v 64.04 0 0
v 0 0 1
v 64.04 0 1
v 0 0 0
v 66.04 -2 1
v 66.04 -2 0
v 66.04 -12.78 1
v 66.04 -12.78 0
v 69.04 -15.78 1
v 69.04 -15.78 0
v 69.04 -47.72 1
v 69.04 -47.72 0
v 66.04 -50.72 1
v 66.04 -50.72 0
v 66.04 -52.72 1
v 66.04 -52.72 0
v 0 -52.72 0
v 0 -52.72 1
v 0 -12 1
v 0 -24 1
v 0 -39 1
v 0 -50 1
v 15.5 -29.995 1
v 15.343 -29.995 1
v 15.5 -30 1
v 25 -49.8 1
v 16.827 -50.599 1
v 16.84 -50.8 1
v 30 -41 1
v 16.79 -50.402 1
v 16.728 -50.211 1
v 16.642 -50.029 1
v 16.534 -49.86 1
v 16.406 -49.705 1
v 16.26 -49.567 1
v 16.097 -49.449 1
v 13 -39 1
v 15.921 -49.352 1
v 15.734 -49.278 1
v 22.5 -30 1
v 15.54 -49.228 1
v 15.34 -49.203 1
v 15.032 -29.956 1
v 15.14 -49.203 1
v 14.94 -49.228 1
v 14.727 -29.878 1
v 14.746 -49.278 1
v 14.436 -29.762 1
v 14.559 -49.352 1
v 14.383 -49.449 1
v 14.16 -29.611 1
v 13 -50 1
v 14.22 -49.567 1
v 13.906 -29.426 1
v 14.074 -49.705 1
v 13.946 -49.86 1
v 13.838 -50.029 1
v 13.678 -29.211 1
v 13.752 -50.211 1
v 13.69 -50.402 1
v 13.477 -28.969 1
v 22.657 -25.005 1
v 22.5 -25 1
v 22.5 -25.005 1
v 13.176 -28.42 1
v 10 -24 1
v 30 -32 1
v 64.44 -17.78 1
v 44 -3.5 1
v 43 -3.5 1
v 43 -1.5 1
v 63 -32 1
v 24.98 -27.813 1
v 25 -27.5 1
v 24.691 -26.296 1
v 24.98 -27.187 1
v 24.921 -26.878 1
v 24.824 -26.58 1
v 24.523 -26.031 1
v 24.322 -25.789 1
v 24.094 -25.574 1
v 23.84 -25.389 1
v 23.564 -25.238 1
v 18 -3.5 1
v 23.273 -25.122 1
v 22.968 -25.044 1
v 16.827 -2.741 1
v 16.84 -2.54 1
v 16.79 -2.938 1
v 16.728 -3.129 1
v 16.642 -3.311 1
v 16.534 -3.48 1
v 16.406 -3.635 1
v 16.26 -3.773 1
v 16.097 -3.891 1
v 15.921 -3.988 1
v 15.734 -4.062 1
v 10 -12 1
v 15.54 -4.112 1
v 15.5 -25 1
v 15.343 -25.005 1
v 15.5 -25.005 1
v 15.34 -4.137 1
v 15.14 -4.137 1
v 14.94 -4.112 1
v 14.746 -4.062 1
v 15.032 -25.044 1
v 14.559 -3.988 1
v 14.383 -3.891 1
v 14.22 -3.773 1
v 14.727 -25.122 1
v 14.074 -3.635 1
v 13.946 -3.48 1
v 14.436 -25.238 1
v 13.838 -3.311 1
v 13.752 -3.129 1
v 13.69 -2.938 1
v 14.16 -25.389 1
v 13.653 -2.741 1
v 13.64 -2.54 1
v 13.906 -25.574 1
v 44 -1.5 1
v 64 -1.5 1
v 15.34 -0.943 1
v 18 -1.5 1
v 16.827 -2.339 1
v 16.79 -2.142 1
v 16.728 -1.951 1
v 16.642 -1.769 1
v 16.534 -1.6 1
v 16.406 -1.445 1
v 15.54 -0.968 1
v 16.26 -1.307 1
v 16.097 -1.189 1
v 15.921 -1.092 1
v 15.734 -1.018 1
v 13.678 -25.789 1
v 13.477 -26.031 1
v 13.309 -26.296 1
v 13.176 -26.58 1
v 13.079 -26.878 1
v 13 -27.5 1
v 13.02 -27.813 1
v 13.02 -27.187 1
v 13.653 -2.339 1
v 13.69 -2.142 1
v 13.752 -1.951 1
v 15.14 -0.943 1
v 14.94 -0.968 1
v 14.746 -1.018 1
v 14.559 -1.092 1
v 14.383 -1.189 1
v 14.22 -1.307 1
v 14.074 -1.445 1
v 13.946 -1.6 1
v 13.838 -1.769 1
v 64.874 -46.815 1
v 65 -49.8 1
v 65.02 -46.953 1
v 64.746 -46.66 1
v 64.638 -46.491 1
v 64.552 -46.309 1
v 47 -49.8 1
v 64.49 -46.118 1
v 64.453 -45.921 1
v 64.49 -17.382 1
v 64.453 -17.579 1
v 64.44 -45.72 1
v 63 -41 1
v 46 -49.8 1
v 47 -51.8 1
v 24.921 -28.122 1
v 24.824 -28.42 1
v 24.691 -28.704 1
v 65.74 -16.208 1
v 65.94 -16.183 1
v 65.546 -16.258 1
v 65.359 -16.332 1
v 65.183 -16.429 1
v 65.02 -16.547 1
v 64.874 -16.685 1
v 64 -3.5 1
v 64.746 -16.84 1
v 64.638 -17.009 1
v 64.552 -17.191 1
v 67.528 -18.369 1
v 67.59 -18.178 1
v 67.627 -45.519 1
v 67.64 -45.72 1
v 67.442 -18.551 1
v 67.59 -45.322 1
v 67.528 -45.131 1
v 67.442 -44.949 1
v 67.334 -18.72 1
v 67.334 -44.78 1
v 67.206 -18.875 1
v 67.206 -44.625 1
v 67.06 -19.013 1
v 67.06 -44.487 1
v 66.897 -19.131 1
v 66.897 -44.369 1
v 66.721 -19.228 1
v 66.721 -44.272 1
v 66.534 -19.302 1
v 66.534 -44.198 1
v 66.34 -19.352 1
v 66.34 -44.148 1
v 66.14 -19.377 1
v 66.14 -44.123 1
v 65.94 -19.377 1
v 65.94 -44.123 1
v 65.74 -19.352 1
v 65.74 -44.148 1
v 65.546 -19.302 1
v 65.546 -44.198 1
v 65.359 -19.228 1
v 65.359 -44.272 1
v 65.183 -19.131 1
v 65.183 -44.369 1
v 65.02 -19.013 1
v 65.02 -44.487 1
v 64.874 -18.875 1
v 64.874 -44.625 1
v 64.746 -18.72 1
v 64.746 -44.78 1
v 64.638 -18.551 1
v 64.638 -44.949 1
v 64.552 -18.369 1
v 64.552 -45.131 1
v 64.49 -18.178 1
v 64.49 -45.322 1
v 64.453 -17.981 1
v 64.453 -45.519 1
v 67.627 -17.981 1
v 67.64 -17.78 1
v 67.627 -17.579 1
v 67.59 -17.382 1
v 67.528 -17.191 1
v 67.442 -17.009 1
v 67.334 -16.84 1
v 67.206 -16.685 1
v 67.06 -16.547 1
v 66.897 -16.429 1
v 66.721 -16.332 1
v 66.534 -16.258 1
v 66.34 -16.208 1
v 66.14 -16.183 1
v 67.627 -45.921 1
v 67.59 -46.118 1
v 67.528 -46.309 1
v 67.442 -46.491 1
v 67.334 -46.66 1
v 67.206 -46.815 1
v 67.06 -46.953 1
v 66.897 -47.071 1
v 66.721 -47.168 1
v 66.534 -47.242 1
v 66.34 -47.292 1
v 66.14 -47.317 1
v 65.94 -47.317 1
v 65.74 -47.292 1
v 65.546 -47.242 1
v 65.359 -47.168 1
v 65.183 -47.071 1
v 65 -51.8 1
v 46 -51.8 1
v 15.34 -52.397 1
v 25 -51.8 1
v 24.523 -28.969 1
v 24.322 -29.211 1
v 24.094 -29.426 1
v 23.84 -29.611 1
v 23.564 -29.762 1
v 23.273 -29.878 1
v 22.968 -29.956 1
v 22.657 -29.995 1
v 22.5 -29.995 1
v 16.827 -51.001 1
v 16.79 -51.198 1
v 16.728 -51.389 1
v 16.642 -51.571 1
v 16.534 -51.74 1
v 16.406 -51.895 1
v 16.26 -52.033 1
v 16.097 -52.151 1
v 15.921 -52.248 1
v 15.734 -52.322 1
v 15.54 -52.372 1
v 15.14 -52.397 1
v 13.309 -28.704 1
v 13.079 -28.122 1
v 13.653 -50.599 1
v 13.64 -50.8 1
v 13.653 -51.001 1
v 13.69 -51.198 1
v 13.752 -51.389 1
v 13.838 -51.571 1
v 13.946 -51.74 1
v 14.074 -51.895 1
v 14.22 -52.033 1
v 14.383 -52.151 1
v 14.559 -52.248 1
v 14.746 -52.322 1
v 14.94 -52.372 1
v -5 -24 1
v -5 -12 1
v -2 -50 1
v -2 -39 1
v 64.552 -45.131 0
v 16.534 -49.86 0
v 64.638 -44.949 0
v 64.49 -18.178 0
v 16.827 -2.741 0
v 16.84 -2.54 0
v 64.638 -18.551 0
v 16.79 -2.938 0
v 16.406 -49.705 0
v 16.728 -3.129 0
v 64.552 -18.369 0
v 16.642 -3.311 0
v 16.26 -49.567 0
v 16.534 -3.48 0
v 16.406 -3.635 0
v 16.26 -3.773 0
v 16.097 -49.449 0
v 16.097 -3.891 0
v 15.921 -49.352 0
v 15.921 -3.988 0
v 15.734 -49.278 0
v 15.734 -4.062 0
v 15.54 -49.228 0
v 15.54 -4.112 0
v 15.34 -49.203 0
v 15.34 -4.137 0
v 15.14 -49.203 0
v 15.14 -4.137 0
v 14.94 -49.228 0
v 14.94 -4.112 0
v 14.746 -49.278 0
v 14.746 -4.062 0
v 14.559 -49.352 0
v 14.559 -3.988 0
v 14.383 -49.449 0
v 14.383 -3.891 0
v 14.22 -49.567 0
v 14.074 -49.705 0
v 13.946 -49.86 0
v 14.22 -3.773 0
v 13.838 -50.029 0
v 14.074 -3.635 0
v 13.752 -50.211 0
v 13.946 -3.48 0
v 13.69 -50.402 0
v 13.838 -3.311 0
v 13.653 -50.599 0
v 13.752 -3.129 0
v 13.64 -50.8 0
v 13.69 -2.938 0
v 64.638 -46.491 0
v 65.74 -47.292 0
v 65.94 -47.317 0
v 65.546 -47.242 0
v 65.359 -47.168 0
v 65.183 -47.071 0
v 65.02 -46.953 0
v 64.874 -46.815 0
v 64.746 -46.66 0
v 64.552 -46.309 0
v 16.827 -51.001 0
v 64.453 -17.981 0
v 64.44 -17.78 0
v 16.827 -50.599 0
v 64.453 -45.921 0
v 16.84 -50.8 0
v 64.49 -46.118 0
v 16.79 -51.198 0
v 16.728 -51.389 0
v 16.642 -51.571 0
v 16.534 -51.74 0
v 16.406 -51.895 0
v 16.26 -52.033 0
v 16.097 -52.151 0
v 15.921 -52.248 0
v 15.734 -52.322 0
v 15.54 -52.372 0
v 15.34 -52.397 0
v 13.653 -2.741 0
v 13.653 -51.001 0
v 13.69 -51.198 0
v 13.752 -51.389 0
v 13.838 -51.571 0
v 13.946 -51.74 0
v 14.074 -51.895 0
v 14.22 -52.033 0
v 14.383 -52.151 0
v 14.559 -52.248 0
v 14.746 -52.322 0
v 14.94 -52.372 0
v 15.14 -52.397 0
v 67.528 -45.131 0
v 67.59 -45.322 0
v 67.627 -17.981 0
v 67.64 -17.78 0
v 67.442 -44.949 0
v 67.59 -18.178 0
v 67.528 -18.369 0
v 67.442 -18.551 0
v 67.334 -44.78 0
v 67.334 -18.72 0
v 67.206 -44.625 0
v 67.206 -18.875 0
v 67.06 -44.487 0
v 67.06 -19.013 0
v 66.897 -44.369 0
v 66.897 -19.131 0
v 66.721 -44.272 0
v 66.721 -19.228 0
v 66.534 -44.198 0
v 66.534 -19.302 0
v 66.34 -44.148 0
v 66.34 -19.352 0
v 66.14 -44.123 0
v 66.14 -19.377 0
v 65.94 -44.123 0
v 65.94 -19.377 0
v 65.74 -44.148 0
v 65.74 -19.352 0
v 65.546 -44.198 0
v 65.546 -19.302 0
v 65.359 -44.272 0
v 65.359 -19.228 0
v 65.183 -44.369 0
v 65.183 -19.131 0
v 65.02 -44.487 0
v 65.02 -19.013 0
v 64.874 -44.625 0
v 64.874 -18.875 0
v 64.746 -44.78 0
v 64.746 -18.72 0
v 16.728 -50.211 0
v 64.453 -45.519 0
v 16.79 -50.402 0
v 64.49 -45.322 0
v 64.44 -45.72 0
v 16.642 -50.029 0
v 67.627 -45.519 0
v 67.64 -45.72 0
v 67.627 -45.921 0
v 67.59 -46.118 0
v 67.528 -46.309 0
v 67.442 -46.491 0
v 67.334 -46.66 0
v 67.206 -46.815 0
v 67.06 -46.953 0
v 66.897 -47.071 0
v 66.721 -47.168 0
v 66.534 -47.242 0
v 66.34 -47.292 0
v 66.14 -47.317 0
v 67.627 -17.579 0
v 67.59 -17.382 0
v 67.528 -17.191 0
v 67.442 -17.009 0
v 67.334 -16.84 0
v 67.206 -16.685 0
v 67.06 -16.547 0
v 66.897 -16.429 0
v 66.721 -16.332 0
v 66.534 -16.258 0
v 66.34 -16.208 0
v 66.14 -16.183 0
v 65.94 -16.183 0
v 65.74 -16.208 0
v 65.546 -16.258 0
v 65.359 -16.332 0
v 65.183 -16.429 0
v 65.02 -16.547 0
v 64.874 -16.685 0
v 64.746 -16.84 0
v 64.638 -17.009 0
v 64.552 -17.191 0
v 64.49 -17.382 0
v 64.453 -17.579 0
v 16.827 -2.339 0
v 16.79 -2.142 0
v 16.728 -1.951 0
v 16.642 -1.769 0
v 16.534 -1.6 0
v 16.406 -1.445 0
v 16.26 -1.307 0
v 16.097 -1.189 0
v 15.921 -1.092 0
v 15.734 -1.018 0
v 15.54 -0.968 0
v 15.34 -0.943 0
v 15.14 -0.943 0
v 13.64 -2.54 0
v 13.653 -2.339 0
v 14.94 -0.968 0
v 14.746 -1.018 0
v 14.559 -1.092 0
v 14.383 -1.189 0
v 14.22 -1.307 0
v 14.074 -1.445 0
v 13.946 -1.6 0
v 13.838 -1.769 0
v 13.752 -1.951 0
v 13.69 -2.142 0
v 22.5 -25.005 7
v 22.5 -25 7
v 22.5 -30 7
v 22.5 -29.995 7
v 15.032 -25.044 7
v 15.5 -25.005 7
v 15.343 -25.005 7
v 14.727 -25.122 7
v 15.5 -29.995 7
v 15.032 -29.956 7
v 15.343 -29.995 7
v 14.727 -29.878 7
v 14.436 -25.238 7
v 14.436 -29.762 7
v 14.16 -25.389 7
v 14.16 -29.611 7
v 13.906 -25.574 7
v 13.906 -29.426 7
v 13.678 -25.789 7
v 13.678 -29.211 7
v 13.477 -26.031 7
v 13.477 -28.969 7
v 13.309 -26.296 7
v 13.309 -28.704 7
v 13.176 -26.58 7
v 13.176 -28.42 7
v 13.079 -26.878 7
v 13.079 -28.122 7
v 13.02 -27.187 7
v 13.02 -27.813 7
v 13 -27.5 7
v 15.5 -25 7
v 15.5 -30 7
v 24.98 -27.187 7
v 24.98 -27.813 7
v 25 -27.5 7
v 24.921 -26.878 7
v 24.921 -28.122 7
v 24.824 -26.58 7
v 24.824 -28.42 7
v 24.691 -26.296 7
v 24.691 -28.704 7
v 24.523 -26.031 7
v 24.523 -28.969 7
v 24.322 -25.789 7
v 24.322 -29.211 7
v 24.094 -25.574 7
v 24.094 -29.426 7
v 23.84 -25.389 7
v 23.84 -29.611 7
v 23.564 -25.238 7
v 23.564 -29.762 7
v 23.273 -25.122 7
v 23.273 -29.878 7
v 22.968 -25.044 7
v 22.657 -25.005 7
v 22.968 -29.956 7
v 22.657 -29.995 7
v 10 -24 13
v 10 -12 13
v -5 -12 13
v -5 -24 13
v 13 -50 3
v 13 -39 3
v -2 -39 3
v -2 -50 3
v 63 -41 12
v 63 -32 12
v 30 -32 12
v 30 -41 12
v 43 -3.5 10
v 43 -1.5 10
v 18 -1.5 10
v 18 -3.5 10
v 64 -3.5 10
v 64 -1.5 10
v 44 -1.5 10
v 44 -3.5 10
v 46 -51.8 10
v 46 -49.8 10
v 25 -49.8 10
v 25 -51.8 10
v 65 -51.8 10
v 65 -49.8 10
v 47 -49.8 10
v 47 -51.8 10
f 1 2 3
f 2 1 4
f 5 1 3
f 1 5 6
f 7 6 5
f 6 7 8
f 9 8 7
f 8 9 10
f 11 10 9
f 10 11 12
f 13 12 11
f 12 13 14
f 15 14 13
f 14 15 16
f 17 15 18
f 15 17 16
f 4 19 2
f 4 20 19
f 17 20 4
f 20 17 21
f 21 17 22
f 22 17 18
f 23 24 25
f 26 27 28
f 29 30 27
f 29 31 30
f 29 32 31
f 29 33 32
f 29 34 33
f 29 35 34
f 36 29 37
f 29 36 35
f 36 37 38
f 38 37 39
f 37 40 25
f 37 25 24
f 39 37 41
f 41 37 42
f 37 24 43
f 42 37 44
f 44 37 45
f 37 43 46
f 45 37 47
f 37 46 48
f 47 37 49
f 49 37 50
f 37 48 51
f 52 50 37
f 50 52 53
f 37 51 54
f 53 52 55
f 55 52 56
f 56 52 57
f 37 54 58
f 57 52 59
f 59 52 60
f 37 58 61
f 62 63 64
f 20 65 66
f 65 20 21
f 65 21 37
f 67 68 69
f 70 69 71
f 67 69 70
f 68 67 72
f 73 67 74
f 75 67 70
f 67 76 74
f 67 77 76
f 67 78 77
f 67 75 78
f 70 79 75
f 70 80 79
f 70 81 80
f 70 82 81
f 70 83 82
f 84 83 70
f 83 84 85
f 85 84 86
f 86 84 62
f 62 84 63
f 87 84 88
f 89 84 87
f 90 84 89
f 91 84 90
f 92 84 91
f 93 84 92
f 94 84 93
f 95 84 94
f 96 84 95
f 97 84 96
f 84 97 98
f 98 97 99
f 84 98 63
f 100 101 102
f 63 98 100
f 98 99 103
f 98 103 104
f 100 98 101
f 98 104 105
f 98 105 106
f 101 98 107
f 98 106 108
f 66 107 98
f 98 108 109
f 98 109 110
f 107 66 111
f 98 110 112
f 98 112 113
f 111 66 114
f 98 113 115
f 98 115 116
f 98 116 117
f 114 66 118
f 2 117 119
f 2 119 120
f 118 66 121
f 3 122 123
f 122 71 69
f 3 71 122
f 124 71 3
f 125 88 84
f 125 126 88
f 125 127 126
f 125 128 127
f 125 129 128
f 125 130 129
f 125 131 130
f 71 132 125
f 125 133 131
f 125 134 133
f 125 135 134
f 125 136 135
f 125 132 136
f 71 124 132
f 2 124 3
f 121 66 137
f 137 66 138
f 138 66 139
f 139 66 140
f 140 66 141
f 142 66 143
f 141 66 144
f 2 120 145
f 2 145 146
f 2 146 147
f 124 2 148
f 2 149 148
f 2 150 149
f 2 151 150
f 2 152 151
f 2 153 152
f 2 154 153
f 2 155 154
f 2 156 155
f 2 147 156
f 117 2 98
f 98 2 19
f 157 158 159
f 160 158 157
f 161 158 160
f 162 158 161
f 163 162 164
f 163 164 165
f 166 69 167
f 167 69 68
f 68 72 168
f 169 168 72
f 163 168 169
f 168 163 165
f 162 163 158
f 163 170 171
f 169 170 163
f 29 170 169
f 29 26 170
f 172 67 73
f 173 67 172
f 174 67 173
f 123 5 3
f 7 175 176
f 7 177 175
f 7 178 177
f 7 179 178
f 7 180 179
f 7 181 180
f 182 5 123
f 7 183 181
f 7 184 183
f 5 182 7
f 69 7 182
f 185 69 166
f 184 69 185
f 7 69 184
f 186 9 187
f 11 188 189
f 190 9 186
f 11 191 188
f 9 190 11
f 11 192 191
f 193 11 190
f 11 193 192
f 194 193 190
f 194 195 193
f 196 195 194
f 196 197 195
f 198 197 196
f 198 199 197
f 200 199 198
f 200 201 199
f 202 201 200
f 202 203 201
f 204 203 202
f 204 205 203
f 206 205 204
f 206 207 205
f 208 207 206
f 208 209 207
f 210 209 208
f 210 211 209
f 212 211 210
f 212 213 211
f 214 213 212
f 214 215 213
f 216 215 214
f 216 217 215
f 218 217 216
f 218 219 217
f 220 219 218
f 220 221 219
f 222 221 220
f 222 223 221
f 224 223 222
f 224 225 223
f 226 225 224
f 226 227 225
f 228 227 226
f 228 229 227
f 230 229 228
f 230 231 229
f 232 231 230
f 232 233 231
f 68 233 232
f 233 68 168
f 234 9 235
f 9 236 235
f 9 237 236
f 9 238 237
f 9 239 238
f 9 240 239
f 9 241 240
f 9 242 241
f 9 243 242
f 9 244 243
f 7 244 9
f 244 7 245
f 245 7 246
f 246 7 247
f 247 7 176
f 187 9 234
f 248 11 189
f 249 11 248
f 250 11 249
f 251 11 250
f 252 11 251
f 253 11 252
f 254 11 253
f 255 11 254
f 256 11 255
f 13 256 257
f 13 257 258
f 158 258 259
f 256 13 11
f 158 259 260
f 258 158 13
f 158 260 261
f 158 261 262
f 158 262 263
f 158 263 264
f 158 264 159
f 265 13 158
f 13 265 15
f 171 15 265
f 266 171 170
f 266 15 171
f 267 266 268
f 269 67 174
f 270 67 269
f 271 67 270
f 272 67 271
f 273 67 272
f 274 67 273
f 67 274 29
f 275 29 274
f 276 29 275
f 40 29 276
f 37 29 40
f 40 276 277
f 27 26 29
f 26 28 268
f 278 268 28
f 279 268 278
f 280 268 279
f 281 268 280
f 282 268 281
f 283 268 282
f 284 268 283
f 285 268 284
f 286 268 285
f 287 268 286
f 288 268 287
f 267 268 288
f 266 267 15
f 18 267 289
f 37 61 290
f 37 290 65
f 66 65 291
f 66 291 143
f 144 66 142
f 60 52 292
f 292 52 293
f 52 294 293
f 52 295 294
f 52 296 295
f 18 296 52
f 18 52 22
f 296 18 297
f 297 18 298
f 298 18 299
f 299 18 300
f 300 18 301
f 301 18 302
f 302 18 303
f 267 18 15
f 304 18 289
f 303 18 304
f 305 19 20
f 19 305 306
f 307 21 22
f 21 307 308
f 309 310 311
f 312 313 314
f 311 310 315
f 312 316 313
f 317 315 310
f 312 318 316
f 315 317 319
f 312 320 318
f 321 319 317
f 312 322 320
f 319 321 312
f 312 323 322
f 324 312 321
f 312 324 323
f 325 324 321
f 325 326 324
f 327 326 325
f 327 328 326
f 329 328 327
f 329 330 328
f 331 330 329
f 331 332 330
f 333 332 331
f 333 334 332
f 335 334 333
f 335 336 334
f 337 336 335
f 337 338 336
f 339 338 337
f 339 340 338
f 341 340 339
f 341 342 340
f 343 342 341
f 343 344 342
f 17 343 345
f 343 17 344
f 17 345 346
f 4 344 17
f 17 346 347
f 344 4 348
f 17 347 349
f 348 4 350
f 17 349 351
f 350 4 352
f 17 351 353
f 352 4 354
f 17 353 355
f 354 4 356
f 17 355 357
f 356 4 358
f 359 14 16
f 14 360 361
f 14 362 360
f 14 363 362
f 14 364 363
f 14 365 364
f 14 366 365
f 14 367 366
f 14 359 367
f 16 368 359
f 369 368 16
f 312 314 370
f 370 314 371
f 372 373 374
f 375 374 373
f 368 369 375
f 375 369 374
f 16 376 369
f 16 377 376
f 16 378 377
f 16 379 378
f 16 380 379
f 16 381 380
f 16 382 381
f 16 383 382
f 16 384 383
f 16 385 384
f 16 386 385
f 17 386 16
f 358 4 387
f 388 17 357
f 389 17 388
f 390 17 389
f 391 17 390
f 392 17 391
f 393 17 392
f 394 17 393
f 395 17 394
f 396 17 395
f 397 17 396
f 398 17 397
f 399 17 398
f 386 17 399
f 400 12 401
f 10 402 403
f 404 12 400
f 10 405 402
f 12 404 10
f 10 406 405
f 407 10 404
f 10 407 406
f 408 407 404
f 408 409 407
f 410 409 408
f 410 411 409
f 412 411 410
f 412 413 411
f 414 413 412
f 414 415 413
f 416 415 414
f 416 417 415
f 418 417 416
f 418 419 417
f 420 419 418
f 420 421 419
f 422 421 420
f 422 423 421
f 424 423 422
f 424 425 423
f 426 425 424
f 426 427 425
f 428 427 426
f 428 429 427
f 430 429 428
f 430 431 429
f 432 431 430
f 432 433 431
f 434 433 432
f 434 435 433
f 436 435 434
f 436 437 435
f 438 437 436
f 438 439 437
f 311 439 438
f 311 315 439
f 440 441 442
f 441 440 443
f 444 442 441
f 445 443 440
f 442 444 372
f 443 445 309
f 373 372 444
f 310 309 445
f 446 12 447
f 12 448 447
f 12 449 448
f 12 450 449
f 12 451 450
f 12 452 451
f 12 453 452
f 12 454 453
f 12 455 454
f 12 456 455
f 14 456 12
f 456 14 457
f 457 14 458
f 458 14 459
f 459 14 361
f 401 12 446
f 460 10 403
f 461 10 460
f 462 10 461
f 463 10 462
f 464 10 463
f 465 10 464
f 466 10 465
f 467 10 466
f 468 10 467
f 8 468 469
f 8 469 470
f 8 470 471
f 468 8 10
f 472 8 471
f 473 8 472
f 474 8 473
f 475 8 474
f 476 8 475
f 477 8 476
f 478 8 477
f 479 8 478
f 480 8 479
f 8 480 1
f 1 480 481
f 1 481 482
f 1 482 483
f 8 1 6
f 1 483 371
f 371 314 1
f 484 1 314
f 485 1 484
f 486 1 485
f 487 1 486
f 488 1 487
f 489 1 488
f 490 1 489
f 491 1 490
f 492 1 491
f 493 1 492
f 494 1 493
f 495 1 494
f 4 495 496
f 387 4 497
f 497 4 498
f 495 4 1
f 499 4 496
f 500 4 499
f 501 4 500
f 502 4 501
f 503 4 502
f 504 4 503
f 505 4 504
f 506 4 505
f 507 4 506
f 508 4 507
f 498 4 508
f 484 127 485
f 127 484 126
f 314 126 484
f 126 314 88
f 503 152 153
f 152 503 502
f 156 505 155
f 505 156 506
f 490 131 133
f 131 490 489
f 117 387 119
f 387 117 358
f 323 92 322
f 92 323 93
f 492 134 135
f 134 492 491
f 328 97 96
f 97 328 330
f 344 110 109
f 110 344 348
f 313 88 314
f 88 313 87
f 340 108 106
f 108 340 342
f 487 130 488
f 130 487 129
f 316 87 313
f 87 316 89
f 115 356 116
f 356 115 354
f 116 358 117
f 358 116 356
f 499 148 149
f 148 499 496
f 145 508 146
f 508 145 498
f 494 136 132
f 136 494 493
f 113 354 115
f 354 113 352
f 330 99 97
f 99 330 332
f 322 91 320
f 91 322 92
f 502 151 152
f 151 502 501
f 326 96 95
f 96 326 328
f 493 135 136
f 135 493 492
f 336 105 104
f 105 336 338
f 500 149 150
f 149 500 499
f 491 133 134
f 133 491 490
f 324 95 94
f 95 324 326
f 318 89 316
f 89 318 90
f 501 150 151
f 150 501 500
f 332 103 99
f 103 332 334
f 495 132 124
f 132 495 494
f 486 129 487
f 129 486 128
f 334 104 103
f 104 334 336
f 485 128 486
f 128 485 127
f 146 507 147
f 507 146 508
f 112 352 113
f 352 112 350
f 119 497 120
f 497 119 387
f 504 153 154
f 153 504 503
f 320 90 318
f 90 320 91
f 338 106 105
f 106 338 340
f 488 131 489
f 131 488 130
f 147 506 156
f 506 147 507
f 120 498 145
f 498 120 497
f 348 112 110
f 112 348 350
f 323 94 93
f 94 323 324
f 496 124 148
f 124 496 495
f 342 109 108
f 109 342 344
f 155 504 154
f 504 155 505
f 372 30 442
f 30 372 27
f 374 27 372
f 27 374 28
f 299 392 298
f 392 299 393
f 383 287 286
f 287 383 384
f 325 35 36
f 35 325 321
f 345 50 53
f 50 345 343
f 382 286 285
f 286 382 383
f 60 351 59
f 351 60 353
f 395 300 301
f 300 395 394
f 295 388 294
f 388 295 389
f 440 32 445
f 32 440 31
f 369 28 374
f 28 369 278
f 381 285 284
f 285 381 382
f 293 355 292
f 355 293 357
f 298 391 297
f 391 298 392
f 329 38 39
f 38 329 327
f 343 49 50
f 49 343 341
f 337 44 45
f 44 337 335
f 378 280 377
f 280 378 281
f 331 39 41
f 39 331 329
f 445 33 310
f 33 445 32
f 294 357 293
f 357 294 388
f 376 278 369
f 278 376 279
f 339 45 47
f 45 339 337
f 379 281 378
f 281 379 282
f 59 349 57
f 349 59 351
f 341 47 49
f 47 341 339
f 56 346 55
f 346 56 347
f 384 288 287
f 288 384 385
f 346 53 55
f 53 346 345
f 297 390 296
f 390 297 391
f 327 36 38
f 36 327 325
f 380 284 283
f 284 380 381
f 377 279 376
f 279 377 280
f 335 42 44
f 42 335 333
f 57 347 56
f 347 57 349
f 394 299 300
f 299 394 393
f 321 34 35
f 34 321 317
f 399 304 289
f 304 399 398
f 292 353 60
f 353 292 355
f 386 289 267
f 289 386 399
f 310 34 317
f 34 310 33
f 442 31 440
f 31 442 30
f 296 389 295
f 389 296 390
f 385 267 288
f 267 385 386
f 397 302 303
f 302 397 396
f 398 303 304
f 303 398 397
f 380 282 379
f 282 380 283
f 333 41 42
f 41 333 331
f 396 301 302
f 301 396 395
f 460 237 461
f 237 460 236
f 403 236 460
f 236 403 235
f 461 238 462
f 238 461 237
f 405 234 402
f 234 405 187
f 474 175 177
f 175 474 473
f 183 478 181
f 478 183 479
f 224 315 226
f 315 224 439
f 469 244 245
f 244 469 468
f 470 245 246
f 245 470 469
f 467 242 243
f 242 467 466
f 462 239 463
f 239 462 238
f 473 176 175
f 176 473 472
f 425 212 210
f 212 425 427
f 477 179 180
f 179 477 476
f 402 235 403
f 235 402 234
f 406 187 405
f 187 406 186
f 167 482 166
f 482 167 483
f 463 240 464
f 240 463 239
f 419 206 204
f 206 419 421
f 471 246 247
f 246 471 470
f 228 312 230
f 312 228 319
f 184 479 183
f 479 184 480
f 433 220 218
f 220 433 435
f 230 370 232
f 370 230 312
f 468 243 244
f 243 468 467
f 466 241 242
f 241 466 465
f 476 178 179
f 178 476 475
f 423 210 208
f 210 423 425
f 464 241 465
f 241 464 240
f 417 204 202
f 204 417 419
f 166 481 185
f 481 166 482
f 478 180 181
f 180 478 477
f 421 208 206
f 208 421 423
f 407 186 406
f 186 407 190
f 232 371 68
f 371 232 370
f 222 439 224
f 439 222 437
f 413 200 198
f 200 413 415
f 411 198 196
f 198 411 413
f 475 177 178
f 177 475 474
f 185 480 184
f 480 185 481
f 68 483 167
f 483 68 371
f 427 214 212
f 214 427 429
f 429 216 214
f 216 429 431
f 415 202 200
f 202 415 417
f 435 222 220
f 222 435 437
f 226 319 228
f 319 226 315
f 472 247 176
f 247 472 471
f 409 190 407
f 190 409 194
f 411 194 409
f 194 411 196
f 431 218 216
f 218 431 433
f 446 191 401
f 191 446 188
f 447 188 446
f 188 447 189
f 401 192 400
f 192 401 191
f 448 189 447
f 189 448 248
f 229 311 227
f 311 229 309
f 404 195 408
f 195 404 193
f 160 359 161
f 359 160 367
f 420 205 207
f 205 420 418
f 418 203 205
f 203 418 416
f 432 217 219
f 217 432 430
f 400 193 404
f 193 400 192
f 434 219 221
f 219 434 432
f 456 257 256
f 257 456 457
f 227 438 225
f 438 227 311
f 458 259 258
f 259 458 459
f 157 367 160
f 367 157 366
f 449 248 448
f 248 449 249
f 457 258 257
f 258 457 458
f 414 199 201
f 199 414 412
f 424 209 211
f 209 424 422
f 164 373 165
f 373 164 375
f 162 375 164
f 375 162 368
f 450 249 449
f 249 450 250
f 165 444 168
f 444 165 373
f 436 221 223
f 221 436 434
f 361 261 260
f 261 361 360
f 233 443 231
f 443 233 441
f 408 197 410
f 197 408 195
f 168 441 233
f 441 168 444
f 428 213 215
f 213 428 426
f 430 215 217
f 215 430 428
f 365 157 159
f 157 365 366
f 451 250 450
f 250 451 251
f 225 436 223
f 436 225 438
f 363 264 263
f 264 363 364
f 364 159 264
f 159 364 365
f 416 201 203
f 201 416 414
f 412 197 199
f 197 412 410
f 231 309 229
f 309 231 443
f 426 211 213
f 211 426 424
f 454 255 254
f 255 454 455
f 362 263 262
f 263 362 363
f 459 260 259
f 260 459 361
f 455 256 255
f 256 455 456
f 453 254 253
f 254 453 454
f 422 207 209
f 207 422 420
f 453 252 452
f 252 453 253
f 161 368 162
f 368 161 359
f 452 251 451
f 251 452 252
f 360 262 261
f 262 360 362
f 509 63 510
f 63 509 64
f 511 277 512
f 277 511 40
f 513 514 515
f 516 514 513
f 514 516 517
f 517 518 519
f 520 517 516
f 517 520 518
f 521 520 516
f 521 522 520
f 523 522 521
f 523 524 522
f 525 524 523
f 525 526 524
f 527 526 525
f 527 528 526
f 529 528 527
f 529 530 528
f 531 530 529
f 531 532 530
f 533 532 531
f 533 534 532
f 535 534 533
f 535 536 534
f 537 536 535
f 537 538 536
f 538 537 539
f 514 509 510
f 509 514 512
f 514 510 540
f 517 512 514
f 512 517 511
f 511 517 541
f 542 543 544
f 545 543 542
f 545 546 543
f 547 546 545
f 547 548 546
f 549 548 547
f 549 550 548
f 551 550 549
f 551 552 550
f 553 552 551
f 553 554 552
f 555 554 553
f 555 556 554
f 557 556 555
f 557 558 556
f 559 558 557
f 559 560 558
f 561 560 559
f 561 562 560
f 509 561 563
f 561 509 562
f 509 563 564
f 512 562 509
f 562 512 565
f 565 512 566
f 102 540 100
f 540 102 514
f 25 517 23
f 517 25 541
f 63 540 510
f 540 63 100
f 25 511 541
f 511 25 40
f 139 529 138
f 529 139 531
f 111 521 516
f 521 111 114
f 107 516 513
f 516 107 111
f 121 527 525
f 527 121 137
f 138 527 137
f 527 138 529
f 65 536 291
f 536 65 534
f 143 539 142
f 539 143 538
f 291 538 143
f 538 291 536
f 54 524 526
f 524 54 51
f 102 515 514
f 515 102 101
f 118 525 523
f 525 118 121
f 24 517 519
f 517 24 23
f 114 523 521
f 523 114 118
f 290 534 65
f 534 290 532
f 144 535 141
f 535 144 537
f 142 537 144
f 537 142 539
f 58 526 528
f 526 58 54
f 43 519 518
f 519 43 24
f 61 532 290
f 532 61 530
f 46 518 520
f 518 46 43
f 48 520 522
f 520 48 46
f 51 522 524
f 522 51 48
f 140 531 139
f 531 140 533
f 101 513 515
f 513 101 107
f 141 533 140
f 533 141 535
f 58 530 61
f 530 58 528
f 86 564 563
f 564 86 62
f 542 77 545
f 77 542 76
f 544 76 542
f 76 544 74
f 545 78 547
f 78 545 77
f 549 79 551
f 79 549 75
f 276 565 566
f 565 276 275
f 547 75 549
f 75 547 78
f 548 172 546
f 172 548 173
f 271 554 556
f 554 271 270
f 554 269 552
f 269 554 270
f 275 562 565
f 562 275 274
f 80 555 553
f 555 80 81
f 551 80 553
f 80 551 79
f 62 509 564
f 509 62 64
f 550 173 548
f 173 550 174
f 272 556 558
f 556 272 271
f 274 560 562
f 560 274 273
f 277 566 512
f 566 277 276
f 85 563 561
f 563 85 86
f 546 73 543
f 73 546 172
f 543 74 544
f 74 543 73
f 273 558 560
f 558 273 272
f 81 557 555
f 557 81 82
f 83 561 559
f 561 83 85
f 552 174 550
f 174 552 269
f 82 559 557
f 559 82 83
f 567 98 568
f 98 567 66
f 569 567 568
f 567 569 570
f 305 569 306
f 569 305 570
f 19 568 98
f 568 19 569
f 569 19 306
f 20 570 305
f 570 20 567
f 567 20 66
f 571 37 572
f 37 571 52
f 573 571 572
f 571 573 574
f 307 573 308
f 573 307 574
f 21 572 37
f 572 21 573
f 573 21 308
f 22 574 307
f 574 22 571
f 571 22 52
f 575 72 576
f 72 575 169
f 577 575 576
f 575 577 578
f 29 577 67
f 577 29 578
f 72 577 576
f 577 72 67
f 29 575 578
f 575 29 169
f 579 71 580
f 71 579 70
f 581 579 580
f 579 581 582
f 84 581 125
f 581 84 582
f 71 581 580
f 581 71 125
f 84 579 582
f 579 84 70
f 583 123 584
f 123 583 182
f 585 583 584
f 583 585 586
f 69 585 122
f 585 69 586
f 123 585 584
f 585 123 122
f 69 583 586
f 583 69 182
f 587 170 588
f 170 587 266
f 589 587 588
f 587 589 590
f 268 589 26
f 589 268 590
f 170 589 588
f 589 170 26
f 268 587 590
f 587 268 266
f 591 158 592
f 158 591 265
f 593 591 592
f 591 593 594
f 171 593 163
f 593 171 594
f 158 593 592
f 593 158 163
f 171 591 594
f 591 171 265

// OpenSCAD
module arduino_uno(){
    color("blue")
    difference() {
        polyhedron(
            points=[
                [    0  ,               0, 0], //  0
                [66.04-2,               0, 0], //  1
                [66.04  ,              -2, 0], //  2
                [66.04  ,    -(17.78-2-3), 0], //  3
                [69.04  ,    -(17.78-2  ), 0], //  4
                [66.04+3,  -(45.72+2    ), 0], //  5
                [66.04  ,  -(45.72+2+3  ), 0], //  6
                [66.04  ,  -(45.72+2+3+2), 0], //  7
                [    0  ,  -(45.72+2+3+2), 0], //  8

                [    0  ,               0, 1], //  9
                [66.04-2,               0, 1], // 10
                [66.04  ,              -2, 1], // 11
                [66.04  ,    -(17.78-2-3), 1], // 12
                [69.04  ,    -(17.78-2  ), 1], // 13
                [66.04+3,  -(45.72+2    ), 1], // 14
                [66.04  ,  -(45.72+2+3  ), 1], // 15
                [66.04  ,  -(45.72+2+3+2), 1], // 16
                [    0  ,  -(45.72+2+3+2), 1], // 17
            ],
            faces=[
                [9,0,1,10],
                [10,1,2,11],
                [11,2,3,12],
                [12,3,4,13],
                [13,4,5,14],
                [14,5,6,15],
                [15,6,7,16],
                [16,7,8,17],
                [17,8,0,9],
                [9,10,11,12,13,14,15,16,17],
                [0,8,7,6,5,4,3,2,1]
            ],
            convexity=5
        );
        translate([15.24, -2.54,-1]) cylinder(d=3.2, h=10, $fn=50);
        translate([15.24,-50.8 ,-1]) cylinder(d=3.2, h=10, $fn=50);
        translate([66.04,-17.78,-1]) cylinder(d=3.2, h=10, $fn=50);
        translate([66.04,-45.72,-1]) cylinder(d=3.2, h=10, $fn=50);
    }
    // USB
    color("grey")
    translate([-5,-12*2,1])
    cube(size=[15, 12, 12]);
    // SD
    color("grey")
    translate([-2,-(50),1])
    cube(size=[15, 11, 2]);
    // Crystal
    color("grey")
    translate([13,-30,1])
    union() {
        longueur = 12;
        largeur  = 5;
        hauteur  = 6;
        translate([largeur/2,0,0]) cube(size=[longueur-largeur,largeur,hauteur]);
        translate([largeur/2,largeur/2,0]) cylinder(d=largeur,h=hauteur, $fn=50);
        translate([longueur-largeur/2,largeur/2,0]) cylinder(d=largeur,h=hauteur, $fn=50);
    }
    // ATMega
    color("black")
    translate([30,-41,0]) 
    cube(size=[33,9,12]);

    // Pins
    color("black")
    translate([18,-3.5,0])
    cube(size=[25,2,10]);

    color("black")
    translate([44,-3.5,0])
    cube(size=[20,2,10]);

    color("black")
    translate([25,-51.8,0])
    cube(size=[21,2,10]);

    color("black")
    translate([47,-51.8,0])
    cube(size=[18,2,10]);
}

arduino_uno();
